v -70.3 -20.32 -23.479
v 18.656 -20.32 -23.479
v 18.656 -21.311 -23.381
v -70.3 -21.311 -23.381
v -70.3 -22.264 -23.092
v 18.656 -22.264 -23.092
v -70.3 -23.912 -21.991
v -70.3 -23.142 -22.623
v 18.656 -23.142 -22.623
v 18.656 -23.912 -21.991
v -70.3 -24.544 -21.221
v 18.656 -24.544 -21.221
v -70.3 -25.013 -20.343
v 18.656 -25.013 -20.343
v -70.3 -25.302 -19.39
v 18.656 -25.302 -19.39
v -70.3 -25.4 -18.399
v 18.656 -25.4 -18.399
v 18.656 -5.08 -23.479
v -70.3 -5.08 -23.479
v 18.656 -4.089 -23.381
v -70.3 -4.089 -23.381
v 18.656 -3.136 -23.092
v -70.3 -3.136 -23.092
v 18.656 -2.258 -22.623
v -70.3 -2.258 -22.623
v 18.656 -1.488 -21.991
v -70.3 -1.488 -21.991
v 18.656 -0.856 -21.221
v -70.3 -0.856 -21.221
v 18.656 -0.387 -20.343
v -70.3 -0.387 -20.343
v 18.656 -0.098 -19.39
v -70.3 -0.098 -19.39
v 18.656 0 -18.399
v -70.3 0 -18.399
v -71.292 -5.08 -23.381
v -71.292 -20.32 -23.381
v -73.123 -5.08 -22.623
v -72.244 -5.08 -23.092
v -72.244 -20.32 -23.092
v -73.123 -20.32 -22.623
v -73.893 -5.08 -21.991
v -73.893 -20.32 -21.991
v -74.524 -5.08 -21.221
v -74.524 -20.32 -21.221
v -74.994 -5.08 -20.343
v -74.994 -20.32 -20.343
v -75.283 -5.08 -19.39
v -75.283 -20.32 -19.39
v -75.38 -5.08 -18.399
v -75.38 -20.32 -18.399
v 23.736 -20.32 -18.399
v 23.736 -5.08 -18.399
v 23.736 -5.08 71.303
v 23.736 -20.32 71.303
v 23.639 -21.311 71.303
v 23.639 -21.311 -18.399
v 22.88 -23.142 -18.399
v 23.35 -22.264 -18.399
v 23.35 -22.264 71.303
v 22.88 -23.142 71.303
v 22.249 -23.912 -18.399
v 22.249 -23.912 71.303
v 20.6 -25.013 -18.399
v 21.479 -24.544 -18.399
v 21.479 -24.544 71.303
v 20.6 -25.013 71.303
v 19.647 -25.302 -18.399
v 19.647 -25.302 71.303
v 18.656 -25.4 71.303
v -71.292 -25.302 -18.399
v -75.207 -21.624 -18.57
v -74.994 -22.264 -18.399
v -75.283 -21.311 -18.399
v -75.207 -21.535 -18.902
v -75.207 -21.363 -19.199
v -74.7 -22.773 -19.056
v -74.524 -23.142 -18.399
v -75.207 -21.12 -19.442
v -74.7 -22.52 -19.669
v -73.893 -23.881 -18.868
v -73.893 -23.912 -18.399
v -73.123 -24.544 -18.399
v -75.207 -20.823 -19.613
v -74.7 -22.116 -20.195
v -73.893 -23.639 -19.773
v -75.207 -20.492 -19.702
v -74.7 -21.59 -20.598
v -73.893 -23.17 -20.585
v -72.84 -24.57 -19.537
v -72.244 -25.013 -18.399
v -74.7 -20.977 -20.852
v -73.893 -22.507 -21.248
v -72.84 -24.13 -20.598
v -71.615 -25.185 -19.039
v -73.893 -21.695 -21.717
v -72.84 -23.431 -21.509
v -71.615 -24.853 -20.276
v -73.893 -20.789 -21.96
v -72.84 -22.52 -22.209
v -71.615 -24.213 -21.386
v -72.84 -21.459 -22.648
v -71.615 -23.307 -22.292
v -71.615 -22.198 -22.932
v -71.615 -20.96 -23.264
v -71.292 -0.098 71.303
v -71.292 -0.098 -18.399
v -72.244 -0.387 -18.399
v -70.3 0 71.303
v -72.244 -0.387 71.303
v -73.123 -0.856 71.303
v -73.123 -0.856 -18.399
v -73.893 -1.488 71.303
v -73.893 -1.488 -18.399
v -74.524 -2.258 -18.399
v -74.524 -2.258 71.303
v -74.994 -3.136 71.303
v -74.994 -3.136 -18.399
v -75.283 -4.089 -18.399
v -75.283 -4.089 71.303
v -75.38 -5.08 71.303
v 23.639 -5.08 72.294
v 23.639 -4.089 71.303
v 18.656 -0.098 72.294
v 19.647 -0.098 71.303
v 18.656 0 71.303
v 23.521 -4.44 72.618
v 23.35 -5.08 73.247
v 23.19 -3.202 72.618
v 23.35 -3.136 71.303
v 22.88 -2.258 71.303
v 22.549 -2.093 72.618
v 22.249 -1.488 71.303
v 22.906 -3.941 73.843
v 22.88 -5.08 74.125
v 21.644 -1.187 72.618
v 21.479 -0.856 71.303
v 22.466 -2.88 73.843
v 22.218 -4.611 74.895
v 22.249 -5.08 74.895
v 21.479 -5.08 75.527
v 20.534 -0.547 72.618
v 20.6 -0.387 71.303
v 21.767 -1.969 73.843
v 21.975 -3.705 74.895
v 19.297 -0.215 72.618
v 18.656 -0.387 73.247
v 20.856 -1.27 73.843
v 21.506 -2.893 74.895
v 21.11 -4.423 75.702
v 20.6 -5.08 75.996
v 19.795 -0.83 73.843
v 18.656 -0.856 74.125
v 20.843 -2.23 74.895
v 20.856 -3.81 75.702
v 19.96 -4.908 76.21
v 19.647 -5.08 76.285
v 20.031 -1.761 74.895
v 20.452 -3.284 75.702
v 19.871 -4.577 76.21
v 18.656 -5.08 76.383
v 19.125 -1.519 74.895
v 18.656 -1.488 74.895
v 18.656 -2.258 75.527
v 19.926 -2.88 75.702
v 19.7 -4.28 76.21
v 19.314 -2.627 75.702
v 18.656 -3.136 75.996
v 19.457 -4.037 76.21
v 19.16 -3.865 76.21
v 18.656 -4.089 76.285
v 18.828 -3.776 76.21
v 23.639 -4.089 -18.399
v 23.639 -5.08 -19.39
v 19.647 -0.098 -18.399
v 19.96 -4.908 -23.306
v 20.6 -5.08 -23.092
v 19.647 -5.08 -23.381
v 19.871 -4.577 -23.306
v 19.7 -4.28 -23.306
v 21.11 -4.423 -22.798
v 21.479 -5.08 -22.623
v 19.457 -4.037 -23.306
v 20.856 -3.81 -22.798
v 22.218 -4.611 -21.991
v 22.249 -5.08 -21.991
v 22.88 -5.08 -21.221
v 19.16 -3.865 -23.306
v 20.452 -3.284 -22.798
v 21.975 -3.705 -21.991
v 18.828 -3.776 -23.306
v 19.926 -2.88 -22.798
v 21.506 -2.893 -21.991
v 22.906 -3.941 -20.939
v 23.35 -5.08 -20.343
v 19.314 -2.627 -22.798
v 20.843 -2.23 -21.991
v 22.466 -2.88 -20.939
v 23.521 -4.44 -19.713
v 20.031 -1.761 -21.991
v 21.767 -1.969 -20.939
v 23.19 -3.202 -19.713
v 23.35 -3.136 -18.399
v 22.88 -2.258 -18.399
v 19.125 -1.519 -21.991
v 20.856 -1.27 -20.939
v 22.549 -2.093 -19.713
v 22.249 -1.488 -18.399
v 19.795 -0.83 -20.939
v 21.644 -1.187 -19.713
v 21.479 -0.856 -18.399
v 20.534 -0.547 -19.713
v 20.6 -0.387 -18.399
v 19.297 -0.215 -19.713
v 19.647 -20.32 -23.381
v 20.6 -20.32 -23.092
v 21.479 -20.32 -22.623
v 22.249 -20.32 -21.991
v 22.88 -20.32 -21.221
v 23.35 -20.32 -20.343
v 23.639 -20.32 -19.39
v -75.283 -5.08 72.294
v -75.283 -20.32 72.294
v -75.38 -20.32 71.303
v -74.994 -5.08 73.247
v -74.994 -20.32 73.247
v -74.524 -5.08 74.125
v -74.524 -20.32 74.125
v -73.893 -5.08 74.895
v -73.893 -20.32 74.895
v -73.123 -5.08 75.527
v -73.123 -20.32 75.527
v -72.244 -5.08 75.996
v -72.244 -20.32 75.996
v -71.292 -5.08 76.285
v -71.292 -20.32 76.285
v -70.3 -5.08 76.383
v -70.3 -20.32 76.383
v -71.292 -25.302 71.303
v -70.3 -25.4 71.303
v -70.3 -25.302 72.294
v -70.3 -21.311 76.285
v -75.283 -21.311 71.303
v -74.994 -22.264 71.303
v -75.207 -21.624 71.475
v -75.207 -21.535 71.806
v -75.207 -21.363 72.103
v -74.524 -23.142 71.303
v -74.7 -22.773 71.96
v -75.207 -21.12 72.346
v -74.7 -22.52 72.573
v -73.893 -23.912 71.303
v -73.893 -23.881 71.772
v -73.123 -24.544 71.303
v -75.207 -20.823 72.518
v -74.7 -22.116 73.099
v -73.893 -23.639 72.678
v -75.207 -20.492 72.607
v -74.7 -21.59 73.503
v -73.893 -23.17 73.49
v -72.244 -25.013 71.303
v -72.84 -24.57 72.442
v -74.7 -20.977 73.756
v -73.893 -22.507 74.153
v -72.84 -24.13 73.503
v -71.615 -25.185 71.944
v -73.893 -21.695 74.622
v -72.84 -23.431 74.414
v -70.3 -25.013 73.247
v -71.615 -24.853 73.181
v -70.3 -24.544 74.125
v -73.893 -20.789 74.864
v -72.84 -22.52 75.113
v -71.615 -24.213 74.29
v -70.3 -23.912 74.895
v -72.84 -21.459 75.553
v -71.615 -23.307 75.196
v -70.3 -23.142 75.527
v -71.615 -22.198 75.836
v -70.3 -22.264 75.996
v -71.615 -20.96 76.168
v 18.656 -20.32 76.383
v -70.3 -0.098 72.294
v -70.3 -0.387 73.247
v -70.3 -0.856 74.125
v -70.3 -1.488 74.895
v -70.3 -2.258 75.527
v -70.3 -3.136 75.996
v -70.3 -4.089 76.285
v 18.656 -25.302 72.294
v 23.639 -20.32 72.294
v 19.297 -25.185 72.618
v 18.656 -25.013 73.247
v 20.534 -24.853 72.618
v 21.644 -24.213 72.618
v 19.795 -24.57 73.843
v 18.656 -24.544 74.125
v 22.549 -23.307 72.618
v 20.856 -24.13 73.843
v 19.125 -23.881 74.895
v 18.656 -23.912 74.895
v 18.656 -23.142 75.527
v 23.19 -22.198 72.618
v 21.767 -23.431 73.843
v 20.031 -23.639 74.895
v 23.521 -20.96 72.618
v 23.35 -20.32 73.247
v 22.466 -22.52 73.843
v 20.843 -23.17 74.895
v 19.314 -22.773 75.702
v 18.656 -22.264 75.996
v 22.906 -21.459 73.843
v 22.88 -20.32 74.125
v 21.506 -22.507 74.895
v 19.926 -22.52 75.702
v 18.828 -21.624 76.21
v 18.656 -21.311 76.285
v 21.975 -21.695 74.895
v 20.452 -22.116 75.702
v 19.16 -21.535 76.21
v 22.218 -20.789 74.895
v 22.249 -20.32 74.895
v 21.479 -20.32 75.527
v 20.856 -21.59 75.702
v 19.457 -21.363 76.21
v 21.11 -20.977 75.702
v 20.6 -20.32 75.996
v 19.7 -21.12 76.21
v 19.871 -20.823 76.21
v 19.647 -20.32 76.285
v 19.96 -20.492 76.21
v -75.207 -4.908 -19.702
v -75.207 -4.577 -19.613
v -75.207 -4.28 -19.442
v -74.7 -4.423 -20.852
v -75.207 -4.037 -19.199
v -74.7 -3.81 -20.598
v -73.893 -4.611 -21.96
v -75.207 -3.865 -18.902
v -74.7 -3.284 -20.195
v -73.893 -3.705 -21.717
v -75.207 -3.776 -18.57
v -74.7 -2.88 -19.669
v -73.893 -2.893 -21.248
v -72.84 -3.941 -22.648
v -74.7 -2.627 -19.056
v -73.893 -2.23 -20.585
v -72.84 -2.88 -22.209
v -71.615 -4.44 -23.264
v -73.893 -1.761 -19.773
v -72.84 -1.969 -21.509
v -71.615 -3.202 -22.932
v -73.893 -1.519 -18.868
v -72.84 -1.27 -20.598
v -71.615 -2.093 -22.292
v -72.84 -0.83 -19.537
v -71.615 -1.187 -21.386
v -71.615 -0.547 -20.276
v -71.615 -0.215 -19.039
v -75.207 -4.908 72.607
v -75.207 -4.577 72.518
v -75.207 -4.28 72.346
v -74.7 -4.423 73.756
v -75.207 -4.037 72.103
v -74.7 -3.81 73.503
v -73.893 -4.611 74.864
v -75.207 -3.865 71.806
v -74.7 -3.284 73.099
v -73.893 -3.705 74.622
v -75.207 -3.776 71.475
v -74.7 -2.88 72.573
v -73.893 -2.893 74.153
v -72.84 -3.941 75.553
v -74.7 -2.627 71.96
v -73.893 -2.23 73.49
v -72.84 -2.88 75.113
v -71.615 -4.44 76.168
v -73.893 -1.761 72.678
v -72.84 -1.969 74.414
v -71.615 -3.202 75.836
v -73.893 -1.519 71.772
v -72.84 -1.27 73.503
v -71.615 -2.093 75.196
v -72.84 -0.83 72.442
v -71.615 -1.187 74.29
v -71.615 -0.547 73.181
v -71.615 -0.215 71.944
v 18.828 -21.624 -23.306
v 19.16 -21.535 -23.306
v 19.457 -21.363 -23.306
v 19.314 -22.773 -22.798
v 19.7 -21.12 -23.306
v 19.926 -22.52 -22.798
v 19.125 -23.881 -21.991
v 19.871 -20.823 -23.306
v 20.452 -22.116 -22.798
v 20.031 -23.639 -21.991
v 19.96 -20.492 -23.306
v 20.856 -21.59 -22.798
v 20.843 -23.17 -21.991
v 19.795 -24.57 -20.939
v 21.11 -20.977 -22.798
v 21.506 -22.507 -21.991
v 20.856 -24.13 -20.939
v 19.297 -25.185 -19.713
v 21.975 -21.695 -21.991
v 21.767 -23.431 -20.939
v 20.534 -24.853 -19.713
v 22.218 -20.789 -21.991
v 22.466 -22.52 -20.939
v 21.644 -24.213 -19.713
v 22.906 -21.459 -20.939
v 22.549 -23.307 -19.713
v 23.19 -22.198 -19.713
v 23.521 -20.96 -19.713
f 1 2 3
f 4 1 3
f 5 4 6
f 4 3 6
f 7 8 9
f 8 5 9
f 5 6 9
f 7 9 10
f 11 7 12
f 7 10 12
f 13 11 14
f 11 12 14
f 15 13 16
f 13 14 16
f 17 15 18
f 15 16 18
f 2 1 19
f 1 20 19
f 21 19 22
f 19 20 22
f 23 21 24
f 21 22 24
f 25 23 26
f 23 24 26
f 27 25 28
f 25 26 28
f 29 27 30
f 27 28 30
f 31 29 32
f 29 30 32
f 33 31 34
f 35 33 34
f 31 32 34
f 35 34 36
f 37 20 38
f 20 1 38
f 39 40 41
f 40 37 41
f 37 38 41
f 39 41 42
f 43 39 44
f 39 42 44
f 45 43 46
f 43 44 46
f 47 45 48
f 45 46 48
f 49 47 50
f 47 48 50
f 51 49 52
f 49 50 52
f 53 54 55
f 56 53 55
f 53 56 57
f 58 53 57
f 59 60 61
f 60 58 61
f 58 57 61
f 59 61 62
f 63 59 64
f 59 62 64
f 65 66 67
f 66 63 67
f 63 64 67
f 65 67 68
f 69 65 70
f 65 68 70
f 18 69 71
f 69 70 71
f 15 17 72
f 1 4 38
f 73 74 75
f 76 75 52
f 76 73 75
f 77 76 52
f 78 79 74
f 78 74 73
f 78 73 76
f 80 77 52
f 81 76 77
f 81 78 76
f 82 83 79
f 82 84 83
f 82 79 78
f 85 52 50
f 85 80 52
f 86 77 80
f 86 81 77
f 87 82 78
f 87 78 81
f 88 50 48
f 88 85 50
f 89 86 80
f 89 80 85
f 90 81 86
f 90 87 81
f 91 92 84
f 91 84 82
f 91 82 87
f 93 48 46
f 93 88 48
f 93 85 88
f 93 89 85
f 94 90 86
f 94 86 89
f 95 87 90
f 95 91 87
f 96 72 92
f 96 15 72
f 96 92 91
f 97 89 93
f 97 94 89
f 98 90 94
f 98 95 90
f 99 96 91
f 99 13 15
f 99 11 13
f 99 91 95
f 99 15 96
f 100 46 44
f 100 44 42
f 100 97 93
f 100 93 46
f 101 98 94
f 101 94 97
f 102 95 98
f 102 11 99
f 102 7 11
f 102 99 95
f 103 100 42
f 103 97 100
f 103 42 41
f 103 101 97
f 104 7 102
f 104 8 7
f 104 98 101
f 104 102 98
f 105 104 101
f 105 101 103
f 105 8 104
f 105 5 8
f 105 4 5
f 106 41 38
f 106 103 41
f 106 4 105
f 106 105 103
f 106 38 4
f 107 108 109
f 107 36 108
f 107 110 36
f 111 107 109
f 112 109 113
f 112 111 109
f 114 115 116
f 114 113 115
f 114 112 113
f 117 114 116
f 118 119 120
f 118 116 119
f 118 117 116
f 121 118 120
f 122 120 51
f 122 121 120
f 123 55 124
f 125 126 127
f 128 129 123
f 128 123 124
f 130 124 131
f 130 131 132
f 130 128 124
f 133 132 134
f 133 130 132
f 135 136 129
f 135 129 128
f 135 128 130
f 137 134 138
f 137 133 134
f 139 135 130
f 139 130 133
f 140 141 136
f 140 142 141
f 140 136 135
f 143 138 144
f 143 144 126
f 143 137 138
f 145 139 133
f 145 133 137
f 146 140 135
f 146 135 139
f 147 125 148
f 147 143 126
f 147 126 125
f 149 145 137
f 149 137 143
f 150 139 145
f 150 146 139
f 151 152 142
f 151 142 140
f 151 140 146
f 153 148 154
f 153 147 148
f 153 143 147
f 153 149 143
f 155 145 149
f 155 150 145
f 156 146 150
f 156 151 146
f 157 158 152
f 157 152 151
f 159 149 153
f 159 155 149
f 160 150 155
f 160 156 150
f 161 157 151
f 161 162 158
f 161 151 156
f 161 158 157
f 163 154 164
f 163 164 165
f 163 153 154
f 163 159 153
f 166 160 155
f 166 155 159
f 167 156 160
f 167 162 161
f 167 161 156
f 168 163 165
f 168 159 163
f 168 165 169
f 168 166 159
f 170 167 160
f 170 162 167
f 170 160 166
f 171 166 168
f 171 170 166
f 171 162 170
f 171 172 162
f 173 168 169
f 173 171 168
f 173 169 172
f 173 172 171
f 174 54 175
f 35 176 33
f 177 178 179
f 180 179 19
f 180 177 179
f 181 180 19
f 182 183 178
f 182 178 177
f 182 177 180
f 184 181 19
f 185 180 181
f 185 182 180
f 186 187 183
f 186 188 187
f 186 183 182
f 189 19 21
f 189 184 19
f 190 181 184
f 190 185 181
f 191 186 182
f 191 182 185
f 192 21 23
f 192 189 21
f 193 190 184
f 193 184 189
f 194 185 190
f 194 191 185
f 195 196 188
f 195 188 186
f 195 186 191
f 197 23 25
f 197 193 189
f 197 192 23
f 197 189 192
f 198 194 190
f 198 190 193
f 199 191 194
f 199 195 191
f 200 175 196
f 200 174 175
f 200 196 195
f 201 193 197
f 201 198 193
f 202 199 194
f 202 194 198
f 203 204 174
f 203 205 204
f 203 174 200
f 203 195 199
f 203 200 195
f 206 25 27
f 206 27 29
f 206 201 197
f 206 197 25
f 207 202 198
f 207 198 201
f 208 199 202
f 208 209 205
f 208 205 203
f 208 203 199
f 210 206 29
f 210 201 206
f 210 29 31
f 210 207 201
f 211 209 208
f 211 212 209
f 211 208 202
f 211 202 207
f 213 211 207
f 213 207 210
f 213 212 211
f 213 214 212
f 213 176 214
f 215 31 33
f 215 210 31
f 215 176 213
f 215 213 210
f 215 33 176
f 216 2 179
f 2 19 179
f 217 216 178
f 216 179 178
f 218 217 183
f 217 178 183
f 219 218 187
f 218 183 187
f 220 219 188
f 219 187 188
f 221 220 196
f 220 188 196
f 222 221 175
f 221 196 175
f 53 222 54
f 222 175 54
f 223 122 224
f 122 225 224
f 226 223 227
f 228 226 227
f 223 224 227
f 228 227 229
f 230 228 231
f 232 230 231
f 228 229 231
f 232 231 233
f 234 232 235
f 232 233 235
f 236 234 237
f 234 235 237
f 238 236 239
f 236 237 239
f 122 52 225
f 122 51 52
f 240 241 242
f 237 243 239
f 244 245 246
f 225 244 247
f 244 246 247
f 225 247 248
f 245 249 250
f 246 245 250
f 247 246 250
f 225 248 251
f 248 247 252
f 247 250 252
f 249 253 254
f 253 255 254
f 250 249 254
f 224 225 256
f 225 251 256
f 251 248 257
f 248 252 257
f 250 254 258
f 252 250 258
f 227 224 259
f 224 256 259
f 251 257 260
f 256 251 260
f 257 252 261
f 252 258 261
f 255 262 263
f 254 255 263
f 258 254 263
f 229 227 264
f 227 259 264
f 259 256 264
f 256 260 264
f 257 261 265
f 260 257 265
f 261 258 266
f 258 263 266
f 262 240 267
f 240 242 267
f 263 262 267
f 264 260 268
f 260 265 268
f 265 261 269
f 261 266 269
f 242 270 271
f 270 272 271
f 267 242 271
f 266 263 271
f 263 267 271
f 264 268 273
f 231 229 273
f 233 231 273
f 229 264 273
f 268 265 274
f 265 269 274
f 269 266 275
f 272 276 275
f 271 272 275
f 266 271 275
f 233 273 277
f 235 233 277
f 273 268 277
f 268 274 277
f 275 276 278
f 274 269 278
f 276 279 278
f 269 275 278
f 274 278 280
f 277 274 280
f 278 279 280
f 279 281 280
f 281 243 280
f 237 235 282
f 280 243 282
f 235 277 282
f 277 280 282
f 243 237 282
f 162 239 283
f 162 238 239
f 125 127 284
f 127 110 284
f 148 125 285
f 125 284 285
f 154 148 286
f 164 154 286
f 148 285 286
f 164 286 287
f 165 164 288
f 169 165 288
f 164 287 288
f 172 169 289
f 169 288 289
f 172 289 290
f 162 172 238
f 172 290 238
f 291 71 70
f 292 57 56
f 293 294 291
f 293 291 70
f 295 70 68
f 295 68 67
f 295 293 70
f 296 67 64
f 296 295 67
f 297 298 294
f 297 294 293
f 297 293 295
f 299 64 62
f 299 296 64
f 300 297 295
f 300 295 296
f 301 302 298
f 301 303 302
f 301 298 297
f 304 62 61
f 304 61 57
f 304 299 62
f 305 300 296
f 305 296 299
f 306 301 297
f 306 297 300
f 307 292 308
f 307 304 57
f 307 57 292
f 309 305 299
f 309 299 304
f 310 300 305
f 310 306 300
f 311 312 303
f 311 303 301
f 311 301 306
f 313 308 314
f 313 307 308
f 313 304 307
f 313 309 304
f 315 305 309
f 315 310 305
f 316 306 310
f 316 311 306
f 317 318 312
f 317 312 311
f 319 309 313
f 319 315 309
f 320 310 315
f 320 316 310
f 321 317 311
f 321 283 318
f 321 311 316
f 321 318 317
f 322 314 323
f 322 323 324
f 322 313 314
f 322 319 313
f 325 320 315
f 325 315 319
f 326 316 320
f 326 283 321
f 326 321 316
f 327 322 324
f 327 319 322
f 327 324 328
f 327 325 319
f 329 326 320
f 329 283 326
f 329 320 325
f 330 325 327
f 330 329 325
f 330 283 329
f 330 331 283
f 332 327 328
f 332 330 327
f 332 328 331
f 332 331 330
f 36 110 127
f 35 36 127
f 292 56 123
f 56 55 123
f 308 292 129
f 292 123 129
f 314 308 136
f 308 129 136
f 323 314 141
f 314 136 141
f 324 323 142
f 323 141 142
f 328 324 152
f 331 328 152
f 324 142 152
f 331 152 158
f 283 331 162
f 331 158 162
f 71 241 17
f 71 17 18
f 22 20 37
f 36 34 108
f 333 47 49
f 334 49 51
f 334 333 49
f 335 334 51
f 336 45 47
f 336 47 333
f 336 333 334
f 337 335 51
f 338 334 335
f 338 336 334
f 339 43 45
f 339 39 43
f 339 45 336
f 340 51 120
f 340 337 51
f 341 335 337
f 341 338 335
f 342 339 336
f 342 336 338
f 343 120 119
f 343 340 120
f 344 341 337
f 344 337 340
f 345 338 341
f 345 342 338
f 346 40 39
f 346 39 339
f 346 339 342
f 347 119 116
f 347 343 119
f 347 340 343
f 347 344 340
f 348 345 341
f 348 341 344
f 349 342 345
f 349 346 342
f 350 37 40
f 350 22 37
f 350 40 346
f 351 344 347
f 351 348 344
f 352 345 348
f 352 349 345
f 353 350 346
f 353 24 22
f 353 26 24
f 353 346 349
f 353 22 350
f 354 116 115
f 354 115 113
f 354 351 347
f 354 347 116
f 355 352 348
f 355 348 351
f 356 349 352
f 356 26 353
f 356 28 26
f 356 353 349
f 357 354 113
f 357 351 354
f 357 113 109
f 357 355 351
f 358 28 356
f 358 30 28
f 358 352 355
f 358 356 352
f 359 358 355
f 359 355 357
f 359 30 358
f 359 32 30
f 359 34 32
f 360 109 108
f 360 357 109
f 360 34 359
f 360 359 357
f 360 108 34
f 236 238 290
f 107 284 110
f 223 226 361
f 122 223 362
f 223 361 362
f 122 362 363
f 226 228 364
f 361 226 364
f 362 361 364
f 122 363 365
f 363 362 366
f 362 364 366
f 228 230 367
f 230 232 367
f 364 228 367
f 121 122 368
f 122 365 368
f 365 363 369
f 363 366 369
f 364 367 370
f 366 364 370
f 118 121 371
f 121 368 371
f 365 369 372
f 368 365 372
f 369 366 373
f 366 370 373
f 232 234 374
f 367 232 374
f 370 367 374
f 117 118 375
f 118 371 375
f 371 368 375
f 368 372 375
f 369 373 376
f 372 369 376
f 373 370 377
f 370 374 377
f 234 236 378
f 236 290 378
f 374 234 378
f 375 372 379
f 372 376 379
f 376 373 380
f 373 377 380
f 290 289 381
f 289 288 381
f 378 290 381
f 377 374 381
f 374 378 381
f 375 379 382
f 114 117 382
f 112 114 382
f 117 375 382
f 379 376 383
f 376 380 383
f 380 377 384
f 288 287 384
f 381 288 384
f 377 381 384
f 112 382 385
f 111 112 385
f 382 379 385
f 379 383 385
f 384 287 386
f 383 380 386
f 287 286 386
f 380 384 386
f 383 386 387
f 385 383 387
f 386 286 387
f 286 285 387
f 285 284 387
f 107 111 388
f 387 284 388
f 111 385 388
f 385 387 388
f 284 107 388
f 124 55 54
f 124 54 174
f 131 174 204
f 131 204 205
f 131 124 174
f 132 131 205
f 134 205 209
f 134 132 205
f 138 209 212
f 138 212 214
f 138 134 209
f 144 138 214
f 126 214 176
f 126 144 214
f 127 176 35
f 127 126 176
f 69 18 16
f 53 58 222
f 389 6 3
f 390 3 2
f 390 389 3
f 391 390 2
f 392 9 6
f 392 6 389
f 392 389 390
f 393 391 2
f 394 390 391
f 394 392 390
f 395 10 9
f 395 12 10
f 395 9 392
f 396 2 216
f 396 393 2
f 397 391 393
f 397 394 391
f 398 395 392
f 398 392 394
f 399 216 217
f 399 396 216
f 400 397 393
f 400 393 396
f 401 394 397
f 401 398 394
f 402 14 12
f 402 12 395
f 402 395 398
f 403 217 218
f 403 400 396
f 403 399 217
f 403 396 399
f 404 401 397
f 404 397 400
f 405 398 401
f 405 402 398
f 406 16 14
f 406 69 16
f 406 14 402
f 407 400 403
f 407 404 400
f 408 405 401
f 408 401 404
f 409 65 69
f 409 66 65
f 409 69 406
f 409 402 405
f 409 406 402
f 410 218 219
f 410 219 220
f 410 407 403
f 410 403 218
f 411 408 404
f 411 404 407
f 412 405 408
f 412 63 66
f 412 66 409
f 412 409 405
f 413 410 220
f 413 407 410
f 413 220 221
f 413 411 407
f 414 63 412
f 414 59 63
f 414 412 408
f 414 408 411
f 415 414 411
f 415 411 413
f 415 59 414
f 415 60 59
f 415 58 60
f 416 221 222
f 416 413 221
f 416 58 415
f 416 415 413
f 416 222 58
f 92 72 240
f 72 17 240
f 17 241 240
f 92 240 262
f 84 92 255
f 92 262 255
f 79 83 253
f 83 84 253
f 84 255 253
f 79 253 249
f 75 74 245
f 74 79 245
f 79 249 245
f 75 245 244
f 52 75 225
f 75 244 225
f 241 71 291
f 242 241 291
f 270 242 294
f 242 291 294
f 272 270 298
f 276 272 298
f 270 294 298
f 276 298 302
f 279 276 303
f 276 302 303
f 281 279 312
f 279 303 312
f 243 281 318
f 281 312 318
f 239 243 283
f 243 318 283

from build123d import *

# Parameters (mm, degrees)
F0_W     = 99.1169009358
F0_H     = 99.8616721481
F1_DEPTH = 25.4
F2_R     = 5.08
F3_R     = 5.08


with BuildPart() as f1:
    # F0 (on Front) → F1 (new body)
    with BuildSketch(Plane.XZ):
        with Locations((-25.8220164105, 26.4521958306)):
            Rectangle(F0_W, F0_H)
    extrude(amount=F1_DEPTH)

    # F2
    f2_edges = [f1.edges().sort_by_distance(p)[0] for p in [
        (23.736434, -25.4, 26.452196),
        (23.736434, 0, 26.452196),
    ]]
    fillet(f2_edges, radius=F2_R)

    # F3
    f3_edges = [f1.edges().sort_by_distance(p)[0] for p in [
        (-28.362016, -25.4, -23.47864),
        (-28.362016, 0, -23.47864),
        (-28.362016, -25.4, 76.383032),
        (18.656434, -25.4, 26.452196),
        (-75.380467, -25.4, 26.452196),
        (-75.380467, -12.7, 76.383032),
        (-75.380467, -12.7, -23.47864),
        (-75.380467, 0, 26.452196),
        (22.248537, -1.487898, -23.47864),
        (23.736434, -5.08, 26.452196),
        (18.656434, 0, 26.452196),
        (22.248537, -1.487898, 76.383032),
        (22.248537, -23.912102, -23.47864),
        (23.736434, -20.32, 26.452196),
        (22.248537, -23.912102, 76.383032),
        (-28.362016, 0, 76.383032),
        (23.736434, -12.7, 76.383032),
        (23.736434, -12.7, -23.47864),
    ]]
    fillet(f3_edges, radius=F3_R)


solid = f1.part
